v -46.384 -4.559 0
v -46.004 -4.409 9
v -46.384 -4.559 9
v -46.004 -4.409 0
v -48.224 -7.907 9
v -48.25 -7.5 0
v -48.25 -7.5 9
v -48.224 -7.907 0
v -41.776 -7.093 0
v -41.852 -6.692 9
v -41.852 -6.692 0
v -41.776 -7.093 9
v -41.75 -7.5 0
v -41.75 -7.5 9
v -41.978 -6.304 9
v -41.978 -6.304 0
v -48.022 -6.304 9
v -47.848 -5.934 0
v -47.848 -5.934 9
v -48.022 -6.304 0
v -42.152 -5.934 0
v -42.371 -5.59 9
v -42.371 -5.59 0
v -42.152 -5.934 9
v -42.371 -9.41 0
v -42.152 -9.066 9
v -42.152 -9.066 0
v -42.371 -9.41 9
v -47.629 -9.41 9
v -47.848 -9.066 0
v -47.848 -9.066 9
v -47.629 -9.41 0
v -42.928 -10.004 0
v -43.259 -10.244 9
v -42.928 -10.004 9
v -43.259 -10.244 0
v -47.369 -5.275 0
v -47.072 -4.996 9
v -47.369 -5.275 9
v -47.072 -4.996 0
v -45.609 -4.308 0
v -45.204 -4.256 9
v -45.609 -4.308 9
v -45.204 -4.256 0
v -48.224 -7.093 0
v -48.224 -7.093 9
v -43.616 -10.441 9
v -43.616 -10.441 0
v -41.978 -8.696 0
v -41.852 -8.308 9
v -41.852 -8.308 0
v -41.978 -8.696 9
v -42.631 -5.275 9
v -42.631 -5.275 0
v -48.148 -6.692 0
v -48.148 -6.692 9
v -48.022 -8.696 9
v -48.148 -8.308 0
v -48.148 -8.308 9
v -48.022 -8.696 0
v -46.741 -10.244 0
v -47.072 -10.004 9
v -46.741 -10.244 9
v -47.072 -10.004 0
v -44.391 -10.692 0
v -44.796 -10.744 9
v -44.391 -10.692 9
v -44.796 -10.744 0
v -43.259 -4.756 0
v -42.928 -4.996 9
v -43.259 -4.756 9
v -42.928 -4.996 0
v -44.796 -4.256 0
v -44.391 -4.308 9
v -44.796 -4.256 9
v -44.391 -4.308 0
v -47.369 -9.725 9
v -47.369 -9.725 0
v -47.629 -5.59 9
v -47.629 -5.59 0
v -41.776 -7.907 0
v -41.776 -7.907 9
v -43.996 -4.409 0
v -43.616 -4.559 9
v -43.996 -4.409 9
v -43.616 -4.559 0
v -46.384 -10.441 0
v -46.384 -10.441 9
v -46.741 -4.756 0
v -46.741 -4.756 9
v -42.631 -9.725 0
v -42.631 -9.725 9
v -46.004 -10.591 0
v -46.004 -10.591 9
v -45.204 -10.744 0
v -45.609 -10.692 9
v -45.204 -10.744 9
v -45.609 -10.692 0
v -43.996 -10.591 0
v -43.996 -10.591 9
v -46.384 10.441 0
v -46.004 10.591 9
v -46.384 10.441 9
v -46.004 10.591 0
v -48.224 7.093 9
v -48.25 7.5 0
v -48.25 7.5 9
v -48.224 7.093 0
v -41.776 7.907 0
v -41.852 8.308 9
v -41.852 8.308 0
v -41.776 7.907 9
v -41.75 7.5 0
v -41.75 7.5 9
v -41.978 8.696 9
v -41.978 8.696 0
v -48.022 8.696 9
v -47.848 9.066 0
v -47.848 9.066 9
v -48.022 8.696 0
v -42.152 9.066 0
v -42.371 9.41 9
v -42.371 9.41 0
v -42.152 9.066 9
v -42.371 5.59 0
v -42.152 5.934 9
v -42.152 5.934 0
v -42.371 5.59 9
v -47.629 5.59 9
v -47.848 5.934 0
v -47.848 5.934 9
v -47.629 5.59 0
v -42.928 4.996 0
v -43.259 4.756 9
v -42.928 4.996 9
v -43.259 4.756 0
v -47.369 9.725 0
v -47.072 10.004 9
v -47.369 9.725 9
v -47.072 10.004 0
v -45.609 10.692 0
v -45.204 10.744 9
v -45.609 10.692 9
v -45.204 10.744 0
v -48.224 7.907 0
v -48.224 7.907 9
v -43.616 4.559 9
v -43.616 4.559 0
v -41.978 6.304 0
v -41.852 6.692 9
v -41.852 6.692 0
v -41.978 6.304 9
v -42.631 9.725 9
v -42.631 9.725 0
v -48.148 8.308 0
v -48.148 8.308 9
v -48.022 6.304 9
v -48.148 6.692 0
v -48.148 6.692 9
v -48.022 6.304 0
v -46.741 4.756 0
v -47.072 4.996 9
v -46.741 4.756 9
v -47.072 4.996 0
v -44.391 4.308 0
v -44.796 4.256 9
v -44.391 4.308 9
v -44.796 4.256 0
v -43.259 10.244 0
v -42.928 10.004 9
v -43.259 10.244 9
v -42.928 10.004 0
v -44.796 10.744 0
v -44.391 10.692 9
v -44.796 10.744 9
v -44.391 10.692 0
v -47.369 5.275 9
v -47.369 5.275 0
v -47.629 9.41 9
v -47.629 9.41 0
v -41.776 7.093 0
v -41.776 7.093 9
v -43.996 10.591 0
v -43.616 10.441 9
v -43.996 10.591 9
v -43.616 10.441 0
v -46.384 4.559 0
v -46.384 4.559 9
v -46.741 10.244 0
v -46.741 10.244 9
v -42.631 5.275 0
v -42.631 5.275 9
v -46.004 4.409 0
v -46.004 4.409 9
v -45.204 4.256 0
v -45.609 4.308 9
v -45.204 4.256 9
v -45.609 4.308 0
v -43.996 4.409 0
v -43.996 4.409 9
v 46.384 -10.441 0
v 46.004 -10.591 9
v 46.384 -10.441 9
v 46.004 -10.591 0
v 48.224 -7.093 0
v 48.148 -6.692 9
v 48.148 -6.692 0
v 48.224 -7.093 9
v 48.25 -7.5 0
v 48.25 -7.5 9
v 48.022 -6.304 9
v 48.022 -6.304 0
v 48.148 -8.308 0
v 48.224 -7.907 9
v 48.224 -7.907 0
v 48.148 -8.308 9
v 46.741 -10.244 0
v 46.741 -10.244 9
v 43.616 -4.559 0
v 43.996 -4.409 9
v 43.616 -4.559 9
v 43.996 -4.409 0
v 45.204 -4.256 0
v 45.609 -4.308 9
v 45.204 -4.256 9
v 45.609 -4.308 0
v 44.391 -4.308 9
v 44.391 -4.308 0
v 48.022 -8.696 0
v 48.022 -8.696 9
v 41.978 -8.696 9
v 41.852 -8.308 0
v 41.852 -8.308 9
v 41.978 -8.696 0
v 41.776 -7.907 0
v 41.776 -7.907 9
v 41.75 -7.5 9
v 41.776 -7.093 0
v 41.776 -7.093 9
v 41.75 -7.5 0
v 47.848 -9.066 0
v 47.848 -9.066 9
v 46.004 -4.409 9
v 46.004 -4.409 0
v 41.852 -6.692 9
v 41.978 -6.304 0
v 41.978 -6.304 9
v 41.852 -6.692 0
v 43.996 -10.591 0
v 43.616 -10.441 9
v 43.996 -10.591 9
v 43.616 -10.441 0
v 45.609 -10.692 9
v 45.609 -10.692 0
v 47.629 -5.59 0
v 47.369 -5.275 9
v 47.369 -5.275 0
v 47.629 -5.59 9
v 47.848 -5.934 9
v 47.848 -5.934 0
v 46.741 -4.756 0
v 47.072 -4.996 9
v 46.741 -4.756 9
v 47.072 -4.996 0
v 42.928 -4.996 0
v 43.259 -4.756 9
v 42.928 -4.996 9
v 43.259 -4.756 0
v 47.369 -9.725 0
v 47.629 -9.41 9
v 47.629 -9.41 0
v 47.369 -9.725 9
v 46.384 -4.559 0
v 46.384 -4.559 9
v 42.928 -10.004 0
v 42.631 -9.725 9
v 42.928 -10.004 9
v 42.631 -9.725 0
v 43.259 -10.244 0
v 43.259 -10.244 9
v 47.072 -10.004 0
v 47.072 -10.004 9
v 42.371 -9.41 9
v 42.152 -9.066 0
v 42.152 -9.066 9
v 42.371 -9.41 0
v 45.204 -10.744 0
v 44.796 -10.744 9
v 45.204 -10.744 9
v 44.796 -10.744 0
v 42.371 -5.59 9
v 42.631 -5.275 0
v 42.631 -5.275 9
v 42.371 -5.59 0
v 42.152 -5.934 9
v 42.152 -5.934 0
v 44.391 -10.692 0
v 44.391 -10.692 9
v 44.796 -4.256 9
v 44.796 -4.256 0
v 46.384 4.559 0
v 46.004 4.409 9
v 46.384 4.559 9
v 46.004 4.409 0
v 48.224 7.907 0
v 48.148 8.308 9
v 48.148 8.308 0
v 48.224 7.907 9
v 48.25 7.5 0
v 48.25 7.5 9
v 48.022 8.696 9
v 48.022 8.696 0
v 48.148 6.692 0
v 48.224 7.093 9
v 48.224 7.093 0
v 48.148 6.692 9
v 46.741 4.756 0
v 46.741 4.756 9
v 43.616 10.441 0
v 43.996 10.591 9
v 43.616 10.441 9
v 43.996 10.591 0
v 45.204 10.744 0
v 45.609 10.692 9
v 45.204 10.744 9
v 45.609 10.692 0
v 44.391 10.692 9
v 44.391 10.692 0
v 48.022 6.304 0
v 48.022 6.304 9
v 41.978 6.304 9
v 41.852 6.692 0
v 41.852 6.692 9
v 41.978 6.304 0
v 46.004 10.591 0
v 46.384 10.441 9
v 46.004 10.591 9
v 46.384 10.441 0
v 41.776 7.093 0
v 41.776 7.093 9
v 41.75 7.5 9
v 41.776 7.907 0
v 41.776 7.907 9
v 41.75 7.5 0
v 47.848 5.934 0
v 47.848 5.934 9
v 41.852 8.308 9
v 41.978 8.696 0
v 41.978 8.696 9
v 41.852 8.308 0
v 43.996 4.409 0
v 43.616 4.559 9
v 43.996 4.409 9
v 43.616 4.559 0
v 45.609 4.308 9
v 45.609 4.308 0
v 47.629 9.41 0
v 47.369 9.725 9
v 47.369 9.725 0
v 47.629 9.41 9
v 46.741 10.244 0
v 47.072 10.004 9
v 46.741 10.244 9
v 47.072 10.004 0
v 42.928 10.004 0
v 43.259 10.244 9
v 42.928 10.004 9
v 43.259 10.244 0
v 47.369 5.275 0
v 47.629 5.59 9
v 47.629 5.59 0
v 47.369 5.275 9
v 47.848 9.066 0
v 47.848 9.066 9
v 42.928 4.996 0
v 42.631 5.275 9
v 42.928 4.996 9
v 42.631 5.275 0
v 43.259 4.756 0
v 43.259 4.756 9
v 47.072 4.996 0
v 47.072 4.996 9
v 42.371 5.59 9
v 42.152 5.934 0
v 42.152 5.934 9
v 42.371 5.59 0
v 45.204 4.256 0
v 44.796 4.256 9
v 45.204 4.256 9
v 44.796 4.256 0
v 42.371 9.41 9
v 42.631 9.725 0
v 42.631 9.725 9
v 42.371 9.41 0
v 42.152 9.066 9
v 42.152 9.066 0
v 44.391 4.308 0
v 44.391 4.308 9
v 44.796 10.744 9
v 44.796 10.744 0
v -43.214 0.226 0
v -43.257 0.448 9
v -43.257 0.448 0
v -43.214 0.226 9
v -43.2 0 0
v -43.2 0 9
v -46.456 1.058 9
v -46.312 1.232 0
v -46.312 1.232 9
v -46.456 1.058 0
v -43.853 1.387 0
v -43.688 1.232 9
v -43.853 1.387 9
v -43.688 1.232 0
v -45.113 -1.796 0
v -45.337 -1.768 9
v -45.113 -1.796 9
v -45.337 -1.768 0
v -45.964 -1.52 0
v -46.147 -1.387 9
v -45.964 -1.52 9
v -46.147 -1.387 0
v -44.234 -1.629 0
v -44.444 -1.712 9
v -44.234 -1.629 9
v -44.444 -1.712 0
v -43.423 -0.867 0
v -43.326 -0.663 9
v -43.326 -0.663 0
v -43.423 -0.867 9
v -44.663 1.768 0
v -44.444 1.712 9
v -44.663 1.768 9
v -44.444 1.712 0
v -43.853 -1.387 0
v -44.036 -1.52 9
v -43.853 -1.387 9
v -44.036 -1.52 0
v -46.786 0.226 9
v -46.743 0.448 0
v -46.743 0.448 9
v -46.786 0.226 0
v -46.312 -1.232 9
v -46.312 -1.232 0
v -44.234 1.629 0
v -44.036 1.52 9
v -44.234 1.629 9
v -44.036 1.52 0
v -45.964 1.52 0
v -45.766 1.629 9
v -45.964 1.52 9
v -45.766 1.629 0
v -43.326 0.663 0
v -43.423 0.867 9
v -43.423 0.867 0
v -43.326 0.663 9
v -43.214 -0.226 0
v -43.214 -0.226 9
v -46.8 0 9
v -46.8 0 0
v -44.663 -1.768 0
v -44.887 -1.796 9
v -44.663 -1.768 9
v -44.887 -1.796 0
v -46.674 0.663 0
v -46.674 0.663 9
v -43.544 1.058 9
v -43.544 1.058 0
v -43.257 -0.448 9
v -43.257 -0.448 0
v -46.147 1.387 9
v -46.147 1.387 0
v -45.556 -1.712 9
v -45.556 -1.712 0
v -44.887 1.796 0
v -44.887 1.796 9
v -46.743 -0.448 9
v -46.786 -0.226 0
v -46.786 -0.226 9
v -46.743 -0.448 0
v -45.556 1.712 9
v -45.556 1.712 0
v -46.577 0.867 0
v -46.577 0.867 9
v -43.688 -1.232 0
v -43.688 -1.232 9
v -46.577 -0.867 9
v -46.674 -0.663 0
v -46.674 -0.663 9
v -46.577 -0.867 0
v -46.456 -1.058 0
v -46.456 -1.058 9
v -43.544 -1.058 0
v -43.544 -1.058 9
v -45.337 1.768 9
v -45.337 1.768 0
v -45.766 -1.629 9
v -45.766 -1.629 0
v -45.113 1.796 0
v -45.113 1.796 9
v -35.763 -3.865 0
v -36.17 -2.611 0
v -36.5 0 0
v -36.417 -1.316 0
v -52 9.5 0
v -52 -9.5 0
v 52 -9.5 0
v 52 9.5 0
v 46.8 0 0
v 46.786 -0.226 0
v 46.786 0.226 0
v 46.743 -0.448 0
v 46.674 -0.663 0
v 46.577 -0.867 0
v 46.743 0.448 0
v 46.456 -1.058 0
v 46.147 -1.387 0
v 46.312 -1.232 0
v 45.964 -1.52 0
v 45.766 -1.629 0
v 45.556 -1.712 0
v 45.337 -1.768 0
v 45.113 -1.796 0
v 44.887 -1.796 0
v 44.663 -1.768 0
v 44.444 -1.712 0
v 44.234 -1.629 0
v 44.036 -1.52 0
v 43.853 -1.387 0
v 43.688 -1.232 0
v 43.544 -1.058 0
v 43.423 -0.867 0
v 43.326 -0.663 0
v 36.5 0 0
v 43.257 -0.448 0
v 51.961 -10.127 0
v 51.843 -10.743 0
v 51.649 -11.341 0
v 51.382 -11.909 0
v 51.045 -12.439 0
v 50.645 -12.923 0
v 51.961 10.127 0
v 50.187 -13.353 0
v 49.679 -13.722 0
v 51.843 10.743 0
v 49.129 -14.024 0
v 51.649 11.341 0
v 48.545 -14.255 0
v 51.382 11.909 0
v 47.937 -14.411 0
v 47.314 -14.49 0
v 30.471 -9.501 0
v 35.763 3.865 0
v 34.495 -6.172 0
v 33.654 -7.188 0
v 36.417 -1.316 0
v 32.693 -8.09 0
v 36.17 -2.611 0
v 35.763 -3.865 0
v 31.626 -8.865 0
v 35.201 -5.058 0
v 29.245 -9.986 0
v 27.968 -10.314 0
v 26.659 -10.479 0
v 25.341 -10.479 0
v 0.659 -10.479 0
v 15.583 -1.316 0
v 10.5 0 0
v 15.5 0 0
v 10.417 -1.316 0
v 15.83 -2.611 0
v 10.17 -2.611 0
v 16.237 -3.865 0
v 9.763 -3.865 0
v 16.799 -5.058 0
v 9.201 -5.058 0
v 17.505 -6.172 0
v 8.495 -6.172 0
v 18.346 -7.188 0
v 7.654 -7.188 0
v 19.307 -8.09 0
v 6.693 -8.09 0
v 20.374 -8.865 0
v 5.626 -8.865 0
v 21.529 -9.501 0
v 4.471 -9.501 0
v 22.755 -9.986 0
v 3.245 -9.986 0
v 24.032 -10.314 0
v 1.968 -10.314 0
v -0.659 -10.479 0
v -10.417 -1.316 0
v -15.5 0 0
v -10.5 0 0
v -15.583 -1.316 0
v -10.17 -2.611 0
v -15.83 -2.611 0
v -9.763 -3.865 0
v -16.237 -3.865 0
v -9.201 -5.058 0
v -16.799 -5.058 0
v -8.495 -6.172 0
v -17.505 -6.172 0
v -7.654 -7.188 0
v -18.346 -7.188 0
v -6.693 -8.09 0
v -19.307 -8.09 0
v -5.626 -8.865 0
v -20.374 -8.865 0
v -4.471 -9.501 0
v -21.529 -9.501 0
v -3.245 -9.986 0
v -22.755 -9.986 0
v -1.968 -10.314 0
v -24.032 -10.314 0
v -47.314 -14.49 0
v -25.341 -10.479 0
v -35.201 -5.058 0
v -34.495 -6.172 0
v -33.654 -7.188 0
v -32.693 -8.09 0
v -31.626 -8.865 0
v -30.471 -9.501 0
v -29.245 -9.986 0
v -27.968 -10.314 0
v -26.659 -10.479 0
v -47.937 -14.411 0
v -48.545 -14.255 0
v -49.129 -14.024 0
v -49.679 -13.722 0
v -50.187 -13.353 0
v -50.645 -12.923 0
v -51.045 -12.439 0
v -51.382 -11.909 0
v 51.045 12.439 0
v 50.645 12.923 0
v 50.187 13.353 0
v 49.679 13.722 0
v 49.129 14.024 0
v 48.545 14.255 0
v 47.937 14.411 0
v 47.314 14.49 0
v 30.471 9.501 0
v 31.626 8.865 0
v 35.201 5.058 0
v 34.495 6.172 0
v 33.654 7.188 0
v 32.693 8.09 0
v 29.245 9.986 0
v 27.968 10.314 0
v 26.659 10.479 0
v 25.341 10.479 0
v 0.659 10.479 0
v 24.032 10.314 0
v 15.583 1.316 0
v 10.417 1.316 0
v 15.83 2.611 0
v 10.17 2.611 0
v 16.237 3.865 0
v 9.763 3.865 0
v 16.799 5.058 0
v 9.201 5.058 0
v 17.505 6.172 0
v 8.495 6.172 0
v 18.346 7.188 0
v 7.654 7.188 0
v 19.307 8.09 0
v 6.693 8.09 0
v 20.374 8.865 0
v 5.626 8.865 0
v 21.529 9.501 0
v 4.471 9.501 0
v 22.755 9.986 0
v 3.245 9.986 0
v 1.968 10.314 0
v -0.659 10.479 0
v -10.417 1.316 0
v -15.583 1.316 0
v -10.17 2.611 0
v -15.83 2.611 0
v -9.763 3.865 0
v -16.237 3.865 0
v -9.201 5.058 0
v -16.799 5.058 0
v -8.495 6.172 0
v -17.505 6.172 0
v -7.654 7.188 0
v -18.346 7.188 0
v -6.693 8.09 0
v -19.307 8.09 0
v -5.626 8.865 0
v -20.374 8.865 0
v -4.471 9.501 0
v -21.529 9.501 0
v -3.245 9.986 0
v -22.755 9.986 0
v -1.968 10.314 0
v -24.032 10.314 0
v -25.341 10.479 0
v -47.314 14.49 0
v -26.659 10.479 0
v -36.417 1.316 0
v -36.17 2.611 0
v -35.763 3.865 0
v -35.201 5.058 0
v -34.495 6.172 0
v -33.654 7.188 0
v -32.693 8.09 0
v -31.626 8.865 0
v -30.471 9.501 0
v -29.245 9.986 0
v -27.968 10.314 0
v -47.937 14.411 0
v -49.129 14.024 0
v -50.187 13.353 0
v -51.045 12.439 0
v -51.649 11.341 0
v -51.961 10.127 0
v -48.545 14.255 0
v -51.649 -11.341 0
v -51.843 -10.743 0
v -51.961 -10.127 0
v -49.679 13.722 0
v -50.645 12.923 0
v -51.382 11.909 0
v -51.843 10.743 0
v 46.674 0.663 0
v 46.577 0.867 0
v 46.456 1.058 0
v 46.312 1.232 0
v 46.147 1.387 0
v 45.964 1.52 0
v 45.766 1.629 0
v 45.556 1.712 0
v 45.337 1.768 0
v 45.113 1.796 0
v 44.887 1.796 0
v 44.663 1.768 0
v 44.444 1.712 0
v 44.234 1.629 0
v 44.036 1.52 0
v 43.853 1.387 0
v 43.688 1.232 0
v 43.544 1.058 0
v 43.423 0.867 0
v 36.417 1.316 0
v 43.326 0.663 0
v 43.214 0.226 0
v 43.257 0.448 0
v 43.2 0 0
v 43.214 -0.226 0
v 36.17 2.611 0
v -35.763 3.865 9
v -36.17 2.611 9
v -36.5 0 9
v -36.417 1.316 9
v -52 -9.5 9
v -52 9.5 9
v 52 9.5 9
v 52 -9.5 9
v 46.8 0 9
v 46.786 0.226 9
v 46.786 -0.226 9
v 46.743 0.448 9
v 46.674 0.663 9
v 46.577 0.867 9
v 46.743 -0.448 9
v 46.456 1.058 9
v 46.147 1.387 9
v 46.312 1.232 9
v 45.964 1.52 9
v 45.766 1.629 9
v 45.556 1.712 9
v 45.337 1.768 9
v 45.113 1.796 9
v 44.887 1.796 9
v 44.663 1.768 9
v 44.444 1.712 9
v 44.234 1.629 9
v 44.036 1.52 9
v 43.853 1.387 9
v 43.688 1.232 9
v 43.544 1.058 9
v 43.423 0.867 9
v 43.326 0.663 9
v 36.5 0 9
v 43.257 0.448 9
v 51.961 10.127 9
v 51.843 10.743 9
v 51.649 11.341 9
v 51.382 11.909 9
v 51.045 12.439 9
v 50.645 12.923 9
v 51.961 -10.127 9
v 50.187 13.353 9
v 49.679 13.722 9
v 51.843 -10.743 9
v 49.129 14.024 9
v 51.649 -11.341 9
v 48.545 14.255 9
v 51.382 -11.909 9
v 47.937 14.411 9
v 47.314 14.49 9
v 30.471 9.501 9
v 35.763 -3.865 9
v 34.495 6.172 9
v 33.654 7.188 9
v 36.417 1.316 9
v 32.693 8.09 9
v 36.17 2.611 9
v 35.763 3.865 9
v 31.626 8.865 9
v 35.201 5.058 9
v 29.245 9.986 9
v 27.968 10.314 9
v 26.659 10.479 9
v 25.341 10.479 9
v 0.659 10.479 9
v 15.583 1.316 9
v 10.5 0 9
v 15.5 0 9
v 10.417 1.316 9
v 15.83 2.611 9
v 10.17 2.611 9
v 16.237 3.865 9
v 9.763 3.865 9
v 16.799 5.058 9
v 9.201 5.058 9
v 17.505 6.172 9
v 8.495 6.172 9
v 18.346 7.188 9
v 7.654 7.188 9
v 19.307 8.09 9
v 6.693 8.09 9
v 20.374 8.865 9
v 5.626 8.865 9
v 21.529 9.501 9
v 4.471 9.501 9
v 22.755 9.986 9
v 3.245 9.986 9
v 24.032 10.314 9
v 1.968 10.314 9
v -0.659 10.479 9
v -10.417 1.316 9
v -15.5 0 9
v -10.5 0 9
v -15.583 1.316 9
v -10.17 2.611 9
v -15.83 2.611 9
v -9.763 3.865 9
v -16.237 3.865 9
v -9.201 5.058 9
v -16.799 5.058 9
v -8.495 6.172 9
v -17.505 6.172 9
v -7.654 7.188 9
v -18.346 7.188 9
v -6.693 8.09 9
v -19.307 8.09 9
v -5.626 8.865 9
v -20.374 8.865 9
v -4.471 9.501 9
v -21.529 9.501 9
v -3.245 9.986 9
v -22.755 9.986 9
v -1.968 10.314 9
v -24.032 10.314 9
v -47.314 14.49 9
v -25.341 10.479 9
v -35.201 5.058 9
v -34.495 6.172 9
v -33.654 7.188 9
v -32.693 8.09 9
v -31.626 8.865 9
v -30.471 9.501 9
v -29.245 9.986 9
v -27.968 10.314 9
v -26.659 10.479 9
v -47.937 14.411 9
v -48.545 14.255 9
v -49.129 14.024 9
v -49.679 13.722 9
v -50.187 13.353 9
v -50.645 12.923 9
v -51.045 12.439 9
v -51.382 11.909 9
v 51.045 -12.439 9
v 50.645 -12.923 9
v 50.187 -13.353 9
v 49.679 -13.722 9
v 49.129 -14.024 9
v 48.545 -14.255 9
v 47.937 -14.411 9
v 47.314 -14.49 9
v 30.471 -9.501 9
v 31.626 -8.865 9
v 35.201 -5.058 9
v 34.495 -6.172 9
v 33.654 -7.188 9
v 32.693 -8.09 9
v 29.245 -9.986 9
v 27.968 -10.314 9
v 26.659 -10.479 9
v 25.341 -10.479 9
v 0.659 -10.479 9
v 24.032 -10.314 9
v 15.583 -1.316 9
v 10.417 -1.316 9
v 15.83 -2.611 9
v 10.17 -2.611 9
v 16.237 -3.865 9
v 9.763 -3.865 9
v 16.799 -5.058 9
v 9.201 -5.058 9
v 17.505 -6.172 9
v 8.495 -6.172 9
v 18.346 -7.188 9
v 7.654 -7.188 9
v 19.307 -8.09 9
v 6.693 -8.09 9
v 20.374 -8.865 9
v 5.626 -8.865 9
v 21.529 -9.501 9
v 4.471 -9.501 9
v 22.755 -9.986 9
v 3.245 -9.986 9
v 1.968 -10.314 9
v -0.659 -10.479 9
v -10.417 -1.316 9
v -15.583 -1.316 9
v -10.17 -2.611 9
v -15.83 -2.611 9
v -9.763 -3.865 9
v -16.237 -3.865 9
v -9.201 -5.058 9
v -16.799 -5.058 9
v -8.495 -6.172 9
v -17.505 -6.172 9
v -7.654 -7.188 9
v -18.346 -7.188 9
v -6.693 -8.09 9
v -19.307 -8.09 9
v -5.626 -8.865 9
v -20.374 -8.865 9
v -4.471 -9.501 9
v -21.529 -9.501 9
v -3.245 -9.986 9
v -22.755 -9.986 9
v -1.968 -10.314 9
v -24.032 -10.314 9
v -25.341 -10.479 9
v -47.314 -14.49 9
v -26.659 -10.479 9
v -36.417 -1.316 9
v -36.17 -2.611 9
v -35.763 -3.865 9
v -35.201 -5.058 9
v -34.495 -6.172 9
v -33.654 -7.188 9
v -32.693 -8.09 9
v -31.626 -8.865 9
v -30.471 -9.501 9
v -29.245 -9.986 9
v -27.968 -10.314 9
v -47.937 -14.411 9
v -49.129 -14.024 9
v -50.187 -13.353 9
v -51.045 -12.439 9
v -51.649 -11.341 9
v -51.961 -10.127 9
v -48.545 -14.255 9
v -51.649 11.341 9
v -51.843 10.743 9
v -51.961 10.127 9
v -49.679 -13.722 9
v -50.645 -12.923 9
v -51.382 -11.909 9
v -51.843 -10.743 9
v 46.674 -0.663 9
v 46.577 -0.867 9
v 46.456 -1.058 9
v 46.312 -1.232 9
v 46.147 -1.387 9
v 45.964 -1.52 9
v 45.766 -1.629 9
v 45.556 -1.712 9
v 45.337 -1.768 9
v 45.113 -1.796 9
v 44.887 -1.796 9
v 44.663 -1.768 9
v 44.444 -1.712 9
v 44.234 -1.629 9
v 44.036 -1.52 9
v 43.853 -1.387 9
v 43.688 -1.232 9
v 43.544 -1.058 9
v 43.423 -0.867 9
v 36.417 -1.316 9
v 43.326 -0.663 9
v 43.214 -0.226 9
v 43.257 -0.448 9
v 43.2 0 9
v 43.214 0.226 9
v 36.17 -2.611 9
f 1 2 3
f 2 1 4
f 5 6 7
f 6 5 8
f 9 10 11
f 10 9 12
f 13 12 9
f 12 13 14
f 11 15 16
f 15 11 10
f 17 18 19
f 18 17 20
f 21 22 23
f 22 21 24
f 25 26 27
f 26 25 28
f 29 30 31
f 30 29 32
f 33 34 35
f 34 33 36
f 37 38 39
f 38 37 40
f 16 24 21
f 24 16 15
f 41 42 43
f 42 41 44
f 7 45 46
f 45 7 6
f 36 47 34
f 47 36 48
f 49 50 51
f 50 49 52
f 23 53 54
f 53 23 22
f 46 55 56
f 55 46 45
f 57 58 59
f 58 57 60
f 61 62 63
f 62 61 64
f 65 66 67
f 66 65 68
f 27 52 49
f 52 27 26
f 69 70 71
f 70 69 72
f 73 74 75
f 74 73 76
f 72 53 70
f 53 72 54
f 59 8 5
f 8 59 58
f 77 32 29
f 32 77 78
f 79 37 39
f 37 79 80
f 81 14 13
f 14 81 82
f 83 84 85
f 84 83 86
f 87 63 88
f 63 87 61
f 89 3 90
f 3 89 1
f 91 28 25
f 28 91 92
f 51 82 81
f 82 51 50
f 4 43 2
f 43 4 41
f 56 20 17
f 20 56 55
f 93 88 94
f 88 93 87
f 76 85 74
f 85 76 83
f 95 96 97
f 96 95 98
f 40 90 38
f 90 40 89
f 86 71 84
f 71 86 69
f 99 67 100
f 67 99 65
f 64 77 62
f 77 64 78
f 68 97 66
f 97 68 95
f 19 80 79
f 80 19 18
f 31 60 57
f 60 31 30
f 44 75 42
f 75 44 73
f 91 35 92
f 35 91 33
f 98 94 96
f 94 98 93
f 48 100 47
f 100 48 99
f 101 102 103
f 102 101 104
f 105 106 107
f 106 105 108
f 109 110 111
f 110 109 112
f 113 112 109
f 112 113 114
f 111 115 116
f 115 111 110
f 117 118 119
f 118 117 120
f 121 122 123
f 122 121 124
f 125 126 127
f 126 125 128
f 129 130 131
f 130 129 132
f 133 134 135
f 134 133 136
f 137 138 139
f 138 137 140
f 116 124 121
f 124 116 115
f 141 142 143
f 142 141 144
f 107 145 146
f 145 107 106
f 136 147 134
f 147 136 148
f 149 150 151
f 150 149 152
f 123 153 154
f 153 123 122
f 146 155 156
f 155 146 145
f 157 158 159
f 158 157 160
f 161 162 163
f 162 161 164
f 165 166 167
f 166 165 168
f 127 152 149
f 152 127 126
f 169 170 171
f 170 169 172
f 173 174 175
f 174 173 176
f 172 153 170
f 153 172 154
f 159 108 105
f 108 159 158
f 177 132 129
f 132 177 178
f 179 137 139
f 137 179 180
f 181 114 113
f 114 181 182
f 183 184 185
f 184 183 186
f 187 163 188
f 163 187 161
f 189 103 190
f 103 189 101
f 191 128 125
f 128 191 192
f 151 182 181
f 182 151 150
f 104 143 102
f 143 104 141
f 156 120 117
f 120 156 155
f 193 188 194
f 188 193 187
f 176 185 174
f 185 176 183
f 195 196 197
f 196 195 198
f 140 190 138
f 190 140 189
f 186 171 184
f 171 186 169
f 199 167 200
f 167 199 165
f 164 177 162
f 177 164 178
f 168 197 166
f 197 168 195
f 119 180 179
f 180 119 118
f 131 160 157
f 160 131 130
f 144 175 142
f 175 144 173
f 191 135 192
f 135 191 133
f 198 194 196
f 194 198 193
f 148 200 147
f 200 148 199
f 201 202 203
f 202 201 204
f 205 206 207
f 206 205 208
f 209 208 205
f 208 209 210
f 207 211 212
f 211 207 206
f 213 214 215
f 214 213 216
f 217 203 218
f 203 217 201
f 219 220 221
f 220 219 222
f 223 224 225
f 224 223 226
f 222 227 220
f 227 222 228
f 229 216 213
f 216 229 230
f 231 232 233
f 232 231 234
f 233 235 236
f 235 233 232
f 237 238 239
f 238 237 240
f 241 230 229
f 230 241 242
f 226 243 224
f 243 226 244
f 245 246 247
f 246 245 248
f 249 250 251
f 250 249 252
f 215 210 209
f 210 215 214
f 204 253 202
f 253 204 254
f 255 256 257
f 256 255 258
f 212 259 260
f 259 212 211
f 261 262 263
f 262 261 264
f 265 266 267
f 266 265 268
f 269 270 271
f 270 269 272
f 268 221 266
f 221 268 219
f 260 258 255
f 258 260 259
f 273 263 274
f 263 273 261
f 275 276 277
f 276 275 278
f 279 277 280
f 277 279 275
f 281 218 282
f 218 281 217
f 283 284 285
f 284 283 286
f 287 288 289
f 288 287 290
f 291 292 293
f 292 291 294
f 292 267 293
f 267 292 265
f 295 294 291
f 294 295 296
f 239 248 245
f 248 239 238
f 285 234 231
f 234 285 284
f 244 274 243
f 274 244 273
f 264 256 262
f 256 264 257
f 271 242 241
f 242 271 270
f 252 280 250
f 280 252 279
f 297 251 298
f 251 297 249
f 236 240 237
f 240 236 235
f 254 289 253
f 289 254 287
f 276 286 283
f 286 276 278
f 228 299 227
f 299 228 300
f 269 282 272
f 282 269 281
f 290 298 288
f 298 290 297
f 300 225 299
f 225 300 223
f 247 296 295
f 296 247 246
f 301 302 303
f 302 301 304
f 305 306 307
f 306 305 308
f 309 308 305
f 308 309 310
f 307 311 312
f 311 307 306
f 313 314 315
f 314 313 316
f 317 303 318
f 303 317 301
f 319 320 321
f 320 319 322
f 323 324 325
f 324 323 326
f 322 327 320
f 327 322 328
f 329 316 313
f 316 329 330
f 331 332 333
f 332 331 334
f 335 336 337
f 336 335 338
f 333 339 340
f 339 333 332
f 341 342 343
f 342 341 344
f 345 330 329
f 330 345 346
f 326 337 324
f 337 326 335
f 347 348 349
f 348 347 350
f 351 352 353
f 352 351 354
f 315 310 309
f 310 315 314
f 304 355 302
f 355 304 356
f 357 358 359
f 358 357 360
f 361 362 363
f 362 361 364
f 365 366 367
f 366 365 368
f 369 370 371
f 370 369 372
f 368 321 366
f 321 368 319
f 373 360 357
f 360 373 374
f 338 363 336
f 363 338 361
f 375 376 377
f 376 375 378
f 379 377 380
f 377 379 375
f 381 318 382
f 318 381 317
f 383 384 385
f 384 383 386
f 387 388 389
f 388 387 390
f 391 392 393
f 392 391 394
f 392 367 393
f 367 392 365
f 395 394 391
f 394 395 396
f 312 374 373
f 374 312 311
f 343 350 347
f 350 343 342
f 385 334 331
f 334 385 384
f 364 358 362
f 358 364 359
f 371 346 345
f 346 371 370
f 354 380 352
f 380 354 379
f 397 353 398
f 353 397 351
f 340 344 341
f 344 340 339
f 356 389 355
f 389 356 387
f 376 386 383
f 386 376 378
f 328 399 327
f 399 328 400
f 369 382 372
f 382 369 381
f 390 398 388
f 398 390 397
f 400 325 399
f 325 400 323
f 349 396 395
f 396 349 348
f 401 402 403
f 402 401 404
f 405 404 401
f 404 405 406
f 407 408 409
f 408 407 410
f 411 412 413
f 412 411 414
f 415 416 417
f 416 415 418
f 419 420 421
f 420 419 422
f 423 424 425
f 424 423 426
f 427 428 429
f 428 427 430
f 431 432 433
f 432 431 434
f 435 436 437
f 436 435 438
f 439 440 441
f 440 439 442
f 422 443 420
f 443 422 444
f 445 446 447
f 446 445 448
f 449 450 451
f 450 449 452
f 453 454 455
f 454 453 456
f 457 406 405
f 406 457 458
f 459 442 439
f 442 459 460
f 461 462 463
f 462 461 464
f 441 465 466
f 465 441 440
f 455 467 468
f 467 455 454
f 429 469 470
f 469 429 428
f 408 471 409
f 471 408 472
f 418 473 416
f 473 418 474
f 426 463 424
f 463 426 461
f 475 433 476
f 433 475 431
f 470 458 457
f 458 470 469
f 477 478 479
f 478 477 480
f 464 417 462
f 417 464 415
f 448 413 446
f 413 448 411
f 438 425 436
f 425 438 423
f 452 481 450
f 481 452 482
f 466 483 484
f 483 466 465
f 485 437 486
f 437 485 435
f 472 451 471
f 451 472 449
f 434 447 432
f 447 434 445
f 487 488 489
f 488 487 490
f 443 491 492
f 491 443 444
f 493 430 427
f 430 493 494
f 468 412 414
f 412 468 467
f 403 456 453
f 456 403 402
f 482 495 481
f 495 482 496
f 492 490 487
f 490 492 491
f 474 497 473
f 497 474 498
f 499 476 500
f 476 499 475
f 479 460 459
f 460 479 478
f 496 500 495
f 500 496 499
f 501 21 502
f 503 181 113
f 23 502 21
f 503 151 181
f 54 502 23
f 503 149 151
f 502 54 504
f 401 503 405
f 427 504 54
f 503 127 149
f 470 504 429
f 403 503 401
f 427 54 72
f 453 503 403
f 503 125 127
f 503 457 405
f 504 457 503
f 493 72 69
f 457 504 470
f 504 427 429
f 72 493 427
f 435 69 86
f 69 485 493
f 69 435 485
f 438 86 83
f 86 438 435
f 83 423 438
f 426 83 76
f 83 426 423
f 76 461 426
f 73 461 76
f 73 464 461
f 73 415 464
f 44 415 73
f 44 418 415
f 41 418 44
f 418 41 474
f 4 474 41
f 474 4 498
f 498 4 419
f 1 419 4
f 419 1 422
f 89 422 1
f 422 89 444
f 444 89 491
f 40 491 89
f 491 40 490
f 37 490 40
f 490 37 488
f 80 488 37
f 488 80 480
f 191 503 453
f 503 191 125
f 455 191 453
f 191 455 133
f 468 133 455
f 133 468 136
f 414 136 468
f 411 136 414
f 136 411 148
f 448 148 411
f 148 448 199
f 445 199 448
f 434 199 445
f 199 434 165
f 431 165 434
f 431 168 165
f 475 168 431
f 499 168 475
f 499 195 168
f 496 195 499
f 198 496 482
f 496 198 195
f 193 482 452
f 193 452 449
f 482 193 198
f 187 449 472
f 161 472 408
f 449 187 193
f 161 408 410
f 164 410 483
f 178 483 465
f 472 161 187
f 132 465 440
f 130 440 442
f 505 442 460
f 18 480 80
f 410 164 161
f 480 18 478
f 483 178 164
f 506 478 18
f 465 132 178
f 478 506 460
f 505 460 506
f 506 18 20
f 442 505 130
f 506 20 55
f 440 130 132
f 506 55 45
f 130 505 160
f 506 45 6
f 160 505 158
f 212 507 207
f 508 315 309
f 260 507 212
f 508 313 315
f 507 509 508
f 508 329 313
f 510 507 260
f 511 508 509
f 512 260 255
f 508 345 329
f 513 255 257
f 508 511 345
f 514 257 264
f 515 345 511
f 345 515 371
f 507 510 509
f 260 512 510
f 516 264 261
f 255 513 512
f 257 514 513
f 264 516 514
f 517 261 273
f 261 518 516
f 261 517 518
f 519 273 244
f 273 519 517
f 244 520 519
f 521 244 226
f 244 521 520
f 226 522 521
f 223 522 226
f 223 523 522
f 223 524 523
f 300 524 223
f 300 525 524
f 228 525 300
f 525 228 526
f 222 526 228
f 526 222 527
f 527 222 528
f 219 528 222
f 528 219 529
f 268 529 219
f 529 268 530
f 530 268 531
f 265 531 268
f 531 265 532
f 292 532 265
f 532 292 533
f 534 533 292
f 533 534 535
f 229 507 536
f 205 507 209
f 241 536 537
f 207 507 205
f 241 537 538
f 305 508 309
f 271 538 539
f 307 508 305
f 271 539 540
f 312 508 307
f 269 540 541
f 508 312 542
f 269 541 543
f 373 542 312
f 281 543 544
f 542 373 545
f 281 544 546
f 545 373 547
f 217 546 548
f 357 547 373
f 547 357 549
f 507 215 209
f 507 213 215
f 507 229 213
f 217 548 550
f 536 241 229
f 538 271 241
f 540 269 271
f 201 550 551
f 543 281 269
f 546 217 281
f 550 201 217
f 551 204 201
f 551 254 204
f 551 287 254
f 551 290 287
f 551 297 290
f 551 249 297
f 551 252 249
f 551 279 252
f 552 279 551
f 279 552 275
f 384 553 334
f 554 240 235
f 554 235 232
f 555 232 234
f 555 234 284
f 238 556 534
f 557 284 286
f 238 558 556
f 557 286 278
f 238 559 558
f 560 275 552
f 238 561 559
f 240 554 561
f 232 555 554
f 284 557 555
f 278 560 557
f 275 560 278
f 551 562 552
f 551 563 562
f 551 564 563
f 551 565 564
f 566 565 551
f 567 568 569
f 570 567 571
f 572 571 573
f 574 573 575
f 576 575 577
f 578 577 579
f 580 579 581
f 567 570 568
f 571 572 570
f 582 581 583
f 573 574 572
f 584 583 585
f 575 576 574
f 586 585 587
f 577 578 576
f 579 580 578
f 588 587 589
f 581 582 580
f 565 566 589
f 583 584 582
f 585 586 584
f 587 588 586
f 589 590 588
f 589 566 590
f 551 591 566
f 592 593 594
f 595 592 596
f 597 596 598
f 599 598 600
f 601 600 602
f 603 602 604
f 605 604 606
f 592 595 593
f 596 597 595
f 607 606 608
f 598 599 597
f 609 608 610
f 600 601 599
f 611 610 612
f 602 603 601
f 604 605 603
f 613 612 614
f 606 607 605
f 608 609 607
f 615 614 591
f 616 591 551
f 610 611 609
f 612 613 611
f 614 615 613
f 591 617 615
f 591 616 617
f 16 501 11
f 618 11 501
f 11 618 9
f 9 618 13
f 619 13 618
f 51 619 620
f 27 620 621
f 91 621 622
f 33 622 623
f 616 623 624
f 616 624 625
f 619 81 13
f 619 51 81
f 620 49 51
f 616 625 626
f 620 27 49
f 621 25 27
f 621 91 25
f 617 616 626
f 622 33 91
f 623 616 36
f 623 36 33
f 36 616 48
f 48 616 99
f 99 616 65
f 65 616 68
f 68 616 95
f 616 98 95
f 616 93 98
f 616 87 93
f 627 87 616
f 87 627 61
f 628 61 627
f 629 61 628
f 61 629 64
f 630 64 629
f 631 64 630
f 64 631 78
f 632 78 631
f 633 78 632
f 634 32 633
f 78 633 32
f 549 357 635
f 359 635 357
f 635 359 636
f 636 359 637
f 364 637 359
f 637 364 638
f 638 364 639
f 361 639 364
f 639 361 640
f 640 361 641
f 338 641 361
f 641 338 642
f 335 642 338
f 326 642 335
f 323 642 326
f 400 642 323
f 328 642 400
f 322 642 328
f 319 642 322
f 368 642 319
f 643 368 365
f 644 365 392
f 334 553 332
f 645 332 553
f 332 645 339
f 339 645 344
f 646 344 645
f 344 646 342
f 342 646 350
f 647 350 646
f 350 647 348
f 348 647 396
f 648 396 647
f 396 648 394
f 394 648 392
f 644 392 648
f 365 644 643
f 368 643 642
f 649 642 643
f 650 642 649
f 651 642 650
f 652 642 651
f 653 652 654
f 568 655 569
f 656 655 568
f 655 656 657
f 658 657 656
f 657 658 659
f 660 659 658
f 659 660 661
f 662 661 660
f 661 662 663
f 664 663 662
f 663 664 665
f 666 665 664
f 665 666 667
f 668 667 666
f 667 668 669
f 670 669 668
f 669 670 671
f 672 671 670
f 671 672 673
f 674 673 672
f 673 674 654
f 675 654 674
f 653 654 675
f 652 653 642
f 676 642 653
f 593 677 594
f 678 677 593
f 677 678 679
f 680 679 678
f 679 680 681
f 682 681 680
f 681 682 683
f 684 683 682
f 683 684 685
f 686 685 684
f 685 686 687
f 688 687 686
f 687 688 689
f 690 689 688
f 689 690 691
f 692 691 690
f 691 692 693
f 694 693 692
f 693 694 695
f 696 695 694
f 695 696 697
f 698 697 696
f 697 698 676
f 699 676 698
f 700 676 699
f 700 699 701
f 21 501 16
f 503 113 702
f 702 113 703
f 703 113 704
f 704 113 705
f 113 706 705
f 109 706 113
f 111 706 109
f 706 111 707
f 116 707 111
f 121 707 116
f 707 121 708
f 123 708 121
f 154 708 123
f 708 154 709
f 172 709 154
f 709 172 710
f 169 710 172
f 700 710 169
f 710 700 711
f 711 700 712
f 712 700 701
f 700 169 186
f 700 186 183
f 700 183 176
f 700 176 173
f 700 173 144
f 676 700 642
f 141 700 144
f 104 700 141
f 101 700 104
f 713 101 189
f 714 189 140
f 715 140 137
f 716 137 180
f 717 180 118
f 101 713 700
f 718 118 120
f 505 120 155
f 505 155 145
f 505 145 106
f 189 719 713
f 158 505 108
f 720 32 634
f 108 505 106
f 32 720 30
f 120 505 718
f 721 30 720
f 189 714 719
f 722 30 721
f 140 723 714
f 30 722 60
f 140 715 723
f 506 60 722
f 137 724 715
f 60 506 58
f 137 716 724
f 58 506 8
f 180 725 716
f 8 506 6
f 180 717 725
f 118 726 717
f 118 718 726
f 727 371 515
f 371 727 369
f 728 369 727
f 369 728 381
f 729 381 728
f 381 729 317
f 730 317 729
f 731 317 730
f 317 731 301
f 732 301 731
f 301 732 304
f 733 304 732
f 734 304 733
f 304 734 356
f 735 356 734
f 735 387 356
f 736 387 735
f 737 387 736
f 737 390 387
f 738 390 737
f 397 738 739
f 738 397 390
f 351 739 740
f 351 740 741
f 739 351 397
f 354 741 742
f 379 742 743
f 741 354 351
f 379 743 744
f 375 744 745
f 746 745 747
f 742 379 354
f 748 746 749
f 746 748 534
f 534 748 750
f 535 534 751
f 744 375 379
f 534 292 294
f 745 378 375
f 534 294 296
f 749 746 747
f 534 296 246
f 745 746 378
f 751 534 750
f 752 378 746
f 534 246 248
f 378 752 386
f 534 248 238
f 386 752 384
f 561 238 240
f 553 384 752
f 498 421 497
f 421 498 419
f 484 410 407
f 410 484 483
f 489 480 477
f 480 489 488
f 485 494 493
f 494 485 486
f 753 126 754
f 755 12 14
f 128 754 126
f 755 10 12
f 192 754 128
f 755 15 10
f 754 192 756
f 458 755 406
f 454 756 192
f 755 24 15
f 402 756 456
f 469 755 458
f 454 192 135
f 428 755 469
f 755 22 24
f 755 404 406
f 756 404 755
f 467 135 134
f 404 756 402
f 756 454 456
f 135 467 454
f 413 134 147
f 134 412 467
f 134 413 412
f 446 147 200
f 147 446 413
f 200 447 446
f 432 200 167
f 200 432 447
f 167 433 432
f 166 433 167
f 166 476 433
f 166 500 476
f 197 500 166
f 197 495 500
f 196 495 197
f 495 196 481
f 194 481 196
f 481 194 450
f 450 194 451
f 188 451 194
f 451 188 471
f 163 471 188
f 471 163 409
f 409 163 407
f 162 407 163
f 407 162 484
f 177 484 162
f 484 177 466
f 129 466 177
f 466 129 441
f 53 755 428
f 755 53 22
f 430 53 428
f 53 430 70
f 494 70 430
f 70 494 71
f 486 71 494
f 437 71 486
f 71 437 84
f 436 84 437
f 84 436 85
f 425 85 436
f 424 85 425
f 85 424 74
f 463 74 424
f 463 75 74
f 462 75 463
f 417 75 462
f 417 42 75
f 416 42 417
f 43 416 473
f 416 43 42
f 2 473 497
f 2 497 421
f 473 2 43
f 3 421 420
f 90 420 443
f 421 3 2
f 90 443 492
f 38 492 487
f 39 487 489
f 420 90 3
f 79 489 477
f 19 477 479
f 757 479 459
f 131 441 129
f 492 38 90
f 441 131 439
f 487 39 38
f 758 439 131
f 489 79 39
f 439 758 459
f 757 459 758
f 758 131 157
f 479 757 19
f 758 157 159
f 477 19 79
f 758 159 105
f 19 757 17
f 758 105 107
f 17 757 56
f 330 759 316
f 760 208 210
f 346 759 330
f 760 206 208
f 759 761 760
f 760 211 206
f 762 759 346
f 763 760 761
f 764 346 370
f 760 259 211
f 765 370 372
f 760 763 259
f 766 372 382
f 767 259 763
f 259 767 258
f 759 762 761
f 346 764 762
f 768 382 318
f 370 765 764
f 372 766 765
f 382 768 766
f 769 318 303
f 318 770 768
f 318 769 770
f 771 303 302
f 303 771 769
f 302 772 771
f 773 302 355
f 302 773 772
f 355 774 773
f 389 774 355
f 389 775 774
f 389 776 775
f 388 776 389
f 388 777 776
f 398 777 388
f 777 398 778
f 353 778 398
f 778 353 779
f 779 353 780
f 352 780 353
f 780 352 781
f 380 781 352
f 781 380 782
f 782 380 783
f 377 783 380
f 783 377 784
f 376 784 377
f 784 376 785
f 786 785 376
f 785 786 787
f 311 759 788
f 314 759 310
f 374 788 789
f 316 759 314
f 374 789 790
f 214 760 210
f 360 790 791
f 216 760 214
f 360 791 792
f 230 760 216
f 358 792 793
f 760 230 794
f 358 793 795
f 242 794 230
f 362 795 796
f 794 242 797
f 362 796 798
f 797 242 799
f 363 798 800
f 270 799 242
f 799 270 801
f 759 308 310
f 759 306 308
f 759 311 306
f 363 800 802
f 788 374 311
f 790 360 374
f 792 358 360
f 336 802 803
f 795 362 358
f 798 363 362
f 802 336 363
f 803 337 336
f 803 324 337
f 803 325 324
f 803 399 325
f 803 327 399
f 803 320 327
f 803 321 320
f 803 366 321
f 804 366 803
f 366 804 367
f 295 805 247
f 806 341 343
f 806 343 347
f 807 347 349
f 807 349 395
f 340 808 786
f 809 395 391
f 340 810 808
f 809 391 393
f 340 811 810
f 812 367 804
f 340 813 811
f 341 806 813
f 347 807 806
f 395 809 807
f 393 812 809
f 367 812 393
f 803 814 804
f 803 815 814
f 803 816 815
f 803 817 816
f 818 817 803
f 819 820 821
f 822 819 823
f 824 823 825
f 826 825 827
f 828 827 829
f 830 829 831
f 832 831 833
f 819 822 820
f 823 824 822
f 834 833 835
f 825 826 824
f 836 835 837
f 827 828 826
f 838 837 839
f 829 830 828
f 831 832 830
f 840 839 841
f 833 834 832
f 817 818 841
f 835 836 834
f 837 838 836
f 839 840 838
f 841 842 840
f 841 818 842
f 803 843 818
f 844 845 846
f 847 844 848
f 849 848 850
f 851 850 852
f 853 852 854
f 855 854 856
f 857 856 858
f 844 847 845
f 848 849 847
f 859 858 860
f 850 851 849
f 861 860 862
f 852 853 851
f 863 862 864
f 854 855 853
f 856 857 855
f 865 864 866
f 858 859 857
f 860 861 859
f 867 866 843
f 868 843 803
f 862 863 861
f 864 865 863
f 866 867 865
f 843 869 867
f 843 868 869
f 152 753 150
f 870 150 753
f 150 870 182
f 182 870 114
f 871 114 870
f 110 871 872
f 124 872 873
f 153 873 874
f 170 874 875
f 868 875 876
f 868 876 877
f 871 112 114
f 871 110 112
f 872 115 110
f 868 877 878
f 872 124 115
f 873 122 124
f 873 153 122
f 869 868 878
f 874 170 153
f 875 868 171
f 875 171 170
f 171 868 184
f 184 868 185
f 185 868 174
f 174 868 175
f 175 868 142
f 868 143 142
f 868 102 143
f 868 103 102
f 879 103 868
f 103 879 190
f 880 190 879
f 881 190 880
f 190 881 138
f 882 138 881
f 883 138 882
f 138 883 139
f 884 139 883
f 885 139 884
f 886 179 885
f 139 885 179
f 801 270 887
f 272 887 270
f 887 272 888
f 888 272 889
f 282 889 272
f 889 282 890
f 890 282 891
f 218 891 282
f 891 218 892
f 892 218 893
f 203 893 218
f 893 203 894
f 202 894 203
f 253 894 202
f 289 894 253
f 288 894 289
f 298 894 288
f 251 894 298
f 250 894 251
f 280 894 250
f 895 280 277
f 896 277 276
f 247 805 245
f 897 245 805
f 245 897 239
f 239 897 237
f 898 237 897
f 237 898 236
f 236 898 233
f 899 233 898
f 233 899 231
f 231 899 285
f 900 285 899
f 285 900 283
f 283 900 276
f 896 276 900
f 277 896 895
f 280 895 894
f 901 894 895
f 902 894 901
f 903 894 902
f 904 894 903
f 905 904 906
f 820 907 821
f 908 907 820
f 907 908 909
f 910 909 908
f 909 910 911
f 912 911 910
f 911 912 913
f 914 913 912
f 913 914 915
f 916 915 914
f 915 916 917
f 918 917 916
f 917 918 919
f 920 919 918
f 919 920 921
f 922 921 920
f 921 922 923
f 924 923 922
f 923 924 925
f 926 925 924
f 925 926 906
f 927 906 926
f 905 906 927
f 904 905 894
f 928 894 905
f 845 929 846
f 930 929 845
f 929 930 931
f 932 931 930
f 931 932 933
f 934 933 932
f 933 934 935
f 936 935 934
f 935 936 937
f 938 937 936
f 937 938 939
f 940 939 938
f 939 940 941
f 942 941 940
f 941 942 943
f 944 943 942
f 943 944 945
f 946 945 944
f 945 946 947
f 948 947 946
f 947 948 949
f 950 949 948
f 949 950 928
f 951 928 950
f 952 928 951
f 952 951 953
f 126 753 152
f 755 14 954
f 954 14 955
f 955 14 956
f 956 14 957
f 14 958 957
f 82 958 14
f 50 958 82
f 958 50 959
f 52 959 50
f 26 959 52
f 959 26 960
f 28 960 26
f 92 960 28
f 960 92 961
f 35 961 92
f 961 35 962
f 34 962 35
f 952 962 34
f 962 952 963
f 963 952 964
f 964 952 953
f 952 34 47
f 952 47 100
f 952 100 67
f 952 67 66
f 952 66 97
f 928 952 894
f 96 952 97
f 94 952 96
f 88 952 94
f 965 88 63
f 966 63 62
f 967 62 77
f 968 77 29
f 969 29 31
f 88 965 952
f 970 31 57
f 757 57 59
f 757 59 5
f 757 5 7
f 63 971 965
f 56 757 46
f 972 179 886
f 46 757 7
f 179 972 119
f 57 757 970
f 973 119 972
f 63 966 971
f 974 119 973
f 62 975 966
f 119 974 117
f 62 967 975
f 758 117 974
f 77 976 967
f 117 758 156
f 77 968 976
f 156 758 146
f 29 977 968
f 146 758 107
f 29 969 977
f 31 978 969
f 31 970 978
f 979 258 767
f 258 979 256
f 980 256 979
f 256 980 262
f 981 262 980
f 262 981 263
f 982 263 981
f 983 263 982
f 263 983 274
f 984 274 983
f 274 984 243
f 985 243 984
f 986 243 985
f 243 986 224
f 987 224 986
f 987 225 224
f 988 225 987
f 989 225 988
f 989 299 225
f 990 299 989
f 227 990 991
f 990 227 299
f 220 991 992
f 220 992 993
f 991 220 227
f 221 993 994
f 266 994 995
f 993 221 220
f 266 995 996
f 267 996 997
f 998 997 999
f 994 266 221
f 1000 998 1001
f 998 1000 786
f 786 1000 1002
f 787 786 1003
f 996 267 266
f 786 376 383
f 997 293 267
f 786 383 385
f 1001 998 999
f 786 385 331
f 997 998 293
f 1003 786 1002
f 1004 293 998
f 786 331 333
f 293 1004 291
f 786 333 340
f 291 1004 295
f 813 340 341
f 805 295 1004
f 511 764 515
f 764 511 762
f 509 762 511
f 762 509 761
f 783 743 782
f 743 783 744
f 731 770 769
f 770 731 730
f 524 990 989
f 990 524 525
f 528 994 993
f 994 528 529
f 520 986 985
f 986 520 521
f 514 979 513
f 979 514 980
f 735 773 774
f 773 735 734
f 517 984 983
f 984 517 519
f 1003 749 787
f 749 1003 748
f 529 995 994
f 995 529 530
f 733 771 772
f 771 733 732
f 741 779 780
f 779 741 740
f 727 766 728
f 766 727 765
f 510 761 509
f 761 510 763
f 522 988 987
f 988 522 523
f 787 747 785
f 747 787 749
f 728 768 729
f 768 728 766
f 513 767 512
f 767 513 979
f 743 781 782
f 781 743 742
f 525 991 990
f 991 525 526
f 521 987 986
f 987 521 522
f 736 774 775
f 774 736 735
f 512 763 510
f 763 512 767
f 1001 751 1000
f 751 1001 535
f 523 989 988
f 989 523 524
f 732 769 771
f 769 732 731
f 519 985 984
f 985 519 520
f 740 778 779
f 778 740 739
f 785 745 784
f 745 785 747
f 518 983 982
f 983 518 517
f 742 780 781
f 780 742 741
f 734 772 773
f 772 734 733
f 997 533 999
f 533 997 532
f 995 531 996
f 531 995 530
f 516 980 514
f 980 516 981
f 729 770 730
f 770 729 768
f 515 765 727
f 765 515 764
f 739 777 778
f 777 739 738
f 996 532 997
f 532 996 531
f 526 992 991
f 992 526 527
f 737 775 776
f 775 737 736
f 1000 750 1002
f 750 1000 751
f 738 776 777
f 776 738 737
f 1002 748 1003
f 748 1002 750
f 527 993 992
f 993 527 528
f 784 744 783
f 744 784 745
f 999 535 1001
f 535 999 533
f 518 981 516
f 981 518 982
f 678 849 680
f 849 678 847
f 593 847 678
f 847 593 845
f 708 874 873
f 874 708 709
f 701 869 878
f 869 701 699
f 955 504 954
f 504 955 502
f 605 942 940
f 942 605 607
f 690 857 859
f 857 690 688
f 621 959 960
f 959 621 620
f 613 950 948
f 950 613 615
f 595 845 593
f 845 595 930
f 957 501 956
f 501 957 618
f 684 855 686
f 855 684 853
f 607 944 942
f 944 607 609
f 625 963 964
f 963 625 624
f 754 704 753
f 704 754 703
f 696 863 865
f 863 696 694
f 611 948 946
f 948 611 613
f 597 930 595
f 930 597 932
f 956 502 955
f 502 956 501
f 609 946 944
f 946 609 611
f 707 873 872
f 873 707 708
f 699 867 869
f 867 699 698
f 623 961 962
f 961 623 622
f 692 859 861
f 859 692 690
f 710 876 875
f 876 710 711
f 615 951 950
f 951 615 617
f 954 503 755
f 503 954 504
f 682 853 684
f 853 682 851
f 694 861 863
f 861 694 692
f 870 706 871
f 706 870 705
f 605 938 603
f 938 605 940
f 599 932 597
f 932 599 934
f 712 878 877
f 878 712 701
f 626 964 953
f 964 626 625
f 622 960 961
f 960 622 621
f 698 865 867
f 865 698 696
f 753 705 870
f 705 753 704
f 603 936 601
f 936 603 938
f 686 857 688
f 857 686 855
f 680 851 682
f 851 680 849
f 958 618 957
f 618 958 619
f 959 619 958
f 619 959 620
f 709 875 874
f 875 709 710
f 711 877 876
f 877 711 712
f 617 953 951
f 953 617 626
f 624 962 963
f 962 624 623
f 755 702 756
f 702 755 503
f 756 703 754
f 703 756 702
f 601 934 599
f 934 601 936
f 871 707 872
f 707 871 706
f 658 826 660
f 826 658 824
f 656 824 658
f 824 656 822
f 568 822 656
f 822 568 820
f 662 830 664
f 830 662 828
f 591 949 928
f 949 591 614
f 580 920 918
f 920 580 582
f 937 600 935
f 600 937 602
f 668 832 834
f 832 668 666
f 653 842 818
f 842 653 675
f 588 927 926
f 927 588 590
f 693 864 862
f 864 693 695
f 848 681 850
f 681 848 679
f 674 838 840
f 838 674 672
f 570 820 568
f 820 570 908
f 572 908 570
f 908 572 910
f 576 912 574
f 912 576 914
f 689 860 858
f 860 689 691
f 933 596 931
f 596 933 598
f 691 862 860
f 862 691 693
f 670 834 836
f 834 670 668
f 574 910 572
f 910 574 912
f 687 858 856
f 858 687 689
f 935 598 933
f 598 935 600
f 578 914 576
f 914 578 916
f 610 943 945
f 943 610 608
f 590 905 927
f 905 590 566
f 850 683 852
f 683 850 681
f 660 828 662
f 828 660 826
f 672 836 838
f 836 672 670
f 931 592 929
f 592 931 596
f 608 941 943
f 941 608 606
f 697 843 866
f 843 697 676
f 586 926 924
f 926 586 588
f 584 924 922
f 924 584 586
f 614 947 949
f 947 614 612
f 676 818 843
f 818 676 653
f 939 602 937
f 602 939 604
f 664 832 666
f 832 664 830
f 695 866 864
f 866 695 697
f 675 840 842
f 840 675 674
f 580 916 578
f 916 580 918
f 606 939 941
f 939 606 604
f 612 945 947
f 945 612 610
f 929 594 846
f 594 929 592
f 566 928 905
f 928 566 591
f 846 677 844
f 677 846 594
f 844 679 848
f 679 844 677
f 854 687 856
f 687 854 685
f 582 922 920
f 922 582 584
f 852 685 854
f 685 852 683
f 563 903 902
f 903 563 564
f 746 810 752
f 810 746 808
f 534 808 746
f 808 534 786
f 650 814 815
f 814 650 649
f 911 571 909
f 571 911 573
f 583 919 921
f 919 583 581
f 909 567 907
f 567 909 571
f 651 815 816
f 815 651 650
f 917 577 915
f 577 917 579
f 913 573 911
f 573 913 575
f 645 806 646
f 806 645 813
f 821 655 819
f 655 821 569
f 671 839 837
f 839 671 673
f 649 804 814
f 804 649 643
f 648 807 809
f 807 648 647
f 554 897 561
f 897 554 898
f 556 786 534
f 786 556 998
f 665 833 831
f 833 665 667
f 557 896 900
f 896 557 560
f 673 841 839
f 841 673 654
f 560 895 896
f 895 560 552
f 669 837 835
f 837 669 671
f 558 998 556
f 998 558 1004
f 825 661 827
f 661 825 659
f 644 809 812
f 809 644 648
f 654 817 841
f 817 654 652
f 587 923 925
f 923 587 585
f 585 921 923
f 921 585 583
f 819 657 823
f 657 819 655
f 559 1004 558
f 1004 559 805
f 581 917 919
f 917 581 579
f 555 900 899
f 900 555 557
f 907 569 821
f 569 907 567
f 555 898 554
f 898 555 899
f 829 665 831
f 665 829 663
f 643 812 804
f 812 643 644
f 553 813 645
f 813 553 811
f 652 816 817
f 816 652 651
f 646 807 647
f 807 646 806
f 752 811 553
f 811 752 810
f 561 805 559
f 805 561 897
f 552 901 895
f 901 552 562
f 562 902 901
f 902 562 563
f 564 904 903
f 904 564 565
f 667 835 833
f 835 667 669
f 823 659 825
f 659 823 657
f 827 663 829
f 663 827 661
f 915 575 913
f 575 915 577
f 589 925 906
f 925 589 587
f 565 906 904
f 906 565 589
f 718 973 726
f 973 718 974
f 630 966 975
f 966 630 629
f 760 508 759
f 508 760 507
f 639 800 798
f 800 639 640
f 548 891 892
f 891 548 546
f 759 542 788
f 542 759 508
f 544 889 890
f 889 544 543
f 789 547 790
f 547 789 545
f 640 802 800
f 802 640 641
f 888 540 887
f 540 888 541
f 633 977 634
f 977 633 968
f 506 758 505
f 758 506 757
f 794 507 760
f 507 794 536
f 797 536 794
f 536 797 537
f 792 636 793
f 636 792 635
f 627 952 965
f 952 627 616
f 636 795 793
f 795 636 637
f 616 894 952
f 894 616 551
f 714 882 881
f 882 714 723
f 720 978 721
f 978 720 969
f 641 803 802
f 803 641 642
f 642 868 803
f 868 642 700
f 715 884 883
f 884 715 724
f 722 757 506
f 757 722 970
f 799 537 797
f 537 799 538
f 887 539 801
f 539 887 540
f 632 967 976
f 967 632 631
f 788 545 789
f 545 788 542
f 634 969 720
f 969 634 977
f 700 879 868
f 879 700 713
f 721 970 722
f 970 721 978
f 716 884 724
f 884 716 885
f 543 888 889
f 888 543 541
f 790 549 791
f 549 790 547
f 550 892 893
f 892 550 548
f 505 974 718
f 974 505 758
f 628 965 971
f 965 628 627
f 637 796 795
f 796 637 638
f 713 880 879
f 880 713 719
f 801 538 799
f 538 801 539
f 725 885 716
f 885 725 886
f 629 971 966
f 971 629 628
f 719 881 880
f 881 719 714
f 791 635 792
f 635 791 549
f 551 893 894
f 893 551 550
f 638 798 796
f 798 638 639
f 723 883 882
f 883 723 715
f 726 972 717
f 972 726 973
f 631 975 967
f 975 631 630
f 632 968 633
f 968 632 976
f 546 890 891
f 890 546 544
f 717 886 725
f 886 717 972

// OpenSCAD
$fn = 50;


difference() {
	union() {
		hull() {
			translate(v = [-47.0000000000, 9.5000000000, 0]) {
				cylinder(h = 9, r = 5);
			}
			translate(v = [47.0000000000, 9.5000000000, 0]) {
				cylinder(h = 9, r = 5);
			}
			translate(v = [-47.0000000000, -9.5000000000, 0]) {
				cylinder(h = 9, r = 5);
			}
			translate(v = [47.0000000000, -9.5000000000, 0]) {
				cylinder(h = 9, r = 5);
			}
		}
	}
	union() {
		#translate(v = [-45.0000000000, -7.5000000000, 0]) {
			cylinder(h = 9, r = 3.2500000000);
		}
		#translate(v = [-45.0000000000, 7.5000000000, 0]) {
			cylinder(h = 9, r = 3.2500000000);
		}
		#translate(v = [45.0000000000, -7.5000000000, 0]) {
			cylinder(h = 9, r = 3.2500000000);
		}
		#translate(v = [45.0000000000, 7.5000000000, 0]) {
			cylinder(h = 9, r = 3.2500000000);
		}
		#translate(v = [-45.0000000000, -7.5000000000, -100.0000000000]) {
			cylinder(h = 200, r = 3.2500000000);
		}
		#translate(v = [-45.0000000000, 7.5000000000, -100.0000000000]) {
			cylinder(h = 200, r = 3.2500000000);
		}
		#translate(v = [45.0000000000, -7.5000000000, -100.0000000000]) {
			cylinder(h = 200, r = 3.2500000000);
		}
		#translate(v = [45.0000000000, 7.5000000000, -100.0000000000]) {
			cylinder(h = 200, r = 3.2500000000);
		}
		#translate(v = [-45.0000000000, -7.5000000000, 0]) {
			cylinder(h = 9, r = 1.8000000000);
		}
		#translate(v = [-45.0000000000, 0.0000000000, 0]) {
			cylinder(h = 9, r = 1.8000000000);
		}
		#translate(v = [-45.0000000000, 7.5000000000, 0]) {
			cylinder(h = 9, r = 1.8000000000);
		}
		#translate(v = [45.0000000000, -7.5000000000, 0]) {
			cylinder(h = 9, r = 1.8000000000);
		}
		#translate(v = [45.0000000000, 0.0000000000, 0]) {
			cylinder(h = 9, r = 1.8000000000);
		}
		#translate(v = [45.0000000000, 7.5000000000, 0]) {
			cylinder(h = 9, r = 1.8000000000);
		}
		#translate(v = [-45.0000000000, -7.5000000000, 0]) {
			cylinder(h = 9, r = 1.8000000000);
		}
		#translate(v = [-45.0000000000, 0.0000000000, 0]) {
			cylinder(h = 9, r = 1.8000000000);
		}
		#translate(v = [-45.0000000000, 7.5000000000, 0]) {
			cylinder(h = 9, r = 1.8000000000);
		}
		#translate(v = [45.0000000000, -7.5000000000, 0]) {
			cylinder(h = 9, r = 1.8000000000);
		}
		#translate(v = [45.0000000000, 0.0000000000, 0]) {
			cylinder(h = 9, r = 1.8000000000);
		}
		#translate(v = [45.0000000000, 7.5000000000, 0]) {
			cylinder(h = 9, r = 1.8000000000);
		}
		#translate(v = [-45.0000000000, -7.5000000000, 0]) {
			cylinder(h = 9, r = 1.8000000000);
		}
		#translate(v = [-45.0000000000, 0.0000000000, 0]) {
			cylinder(h = 9, r = 1.8000000000);
		}
		#translate(v = [-45.0000000000, 7.5000000000, 0]) {
			cylinder(h = 9, r = 1.8000000000);
		}
		#translate(v = [45.0000000000, -7.5000000000, 0]) {
			cylinder(h = 9, r = 1.8000000000);
		}
		#translate(v = [45.0000000000, 0.0000000000, 0]) {
			cylinder(h = 9, r = 1.8000000000);
		}
		#translate(v = [45.0000000000, 7.5000000000, 0]) {
			cylinder(h = 9, r = 1.8000000000);
		}
		#translate(v = [-26.0000000000, 0, 0]) {
			cylinder(h = 9, r = 10.5000000000);
		}
		#cylinder(h = 9, r = 10.5000000000);
		#translate(v = [26.0000000000, 0, 0]) {
			cylinder(h = 9, r = 10.5000000000);
		}
	}
}
